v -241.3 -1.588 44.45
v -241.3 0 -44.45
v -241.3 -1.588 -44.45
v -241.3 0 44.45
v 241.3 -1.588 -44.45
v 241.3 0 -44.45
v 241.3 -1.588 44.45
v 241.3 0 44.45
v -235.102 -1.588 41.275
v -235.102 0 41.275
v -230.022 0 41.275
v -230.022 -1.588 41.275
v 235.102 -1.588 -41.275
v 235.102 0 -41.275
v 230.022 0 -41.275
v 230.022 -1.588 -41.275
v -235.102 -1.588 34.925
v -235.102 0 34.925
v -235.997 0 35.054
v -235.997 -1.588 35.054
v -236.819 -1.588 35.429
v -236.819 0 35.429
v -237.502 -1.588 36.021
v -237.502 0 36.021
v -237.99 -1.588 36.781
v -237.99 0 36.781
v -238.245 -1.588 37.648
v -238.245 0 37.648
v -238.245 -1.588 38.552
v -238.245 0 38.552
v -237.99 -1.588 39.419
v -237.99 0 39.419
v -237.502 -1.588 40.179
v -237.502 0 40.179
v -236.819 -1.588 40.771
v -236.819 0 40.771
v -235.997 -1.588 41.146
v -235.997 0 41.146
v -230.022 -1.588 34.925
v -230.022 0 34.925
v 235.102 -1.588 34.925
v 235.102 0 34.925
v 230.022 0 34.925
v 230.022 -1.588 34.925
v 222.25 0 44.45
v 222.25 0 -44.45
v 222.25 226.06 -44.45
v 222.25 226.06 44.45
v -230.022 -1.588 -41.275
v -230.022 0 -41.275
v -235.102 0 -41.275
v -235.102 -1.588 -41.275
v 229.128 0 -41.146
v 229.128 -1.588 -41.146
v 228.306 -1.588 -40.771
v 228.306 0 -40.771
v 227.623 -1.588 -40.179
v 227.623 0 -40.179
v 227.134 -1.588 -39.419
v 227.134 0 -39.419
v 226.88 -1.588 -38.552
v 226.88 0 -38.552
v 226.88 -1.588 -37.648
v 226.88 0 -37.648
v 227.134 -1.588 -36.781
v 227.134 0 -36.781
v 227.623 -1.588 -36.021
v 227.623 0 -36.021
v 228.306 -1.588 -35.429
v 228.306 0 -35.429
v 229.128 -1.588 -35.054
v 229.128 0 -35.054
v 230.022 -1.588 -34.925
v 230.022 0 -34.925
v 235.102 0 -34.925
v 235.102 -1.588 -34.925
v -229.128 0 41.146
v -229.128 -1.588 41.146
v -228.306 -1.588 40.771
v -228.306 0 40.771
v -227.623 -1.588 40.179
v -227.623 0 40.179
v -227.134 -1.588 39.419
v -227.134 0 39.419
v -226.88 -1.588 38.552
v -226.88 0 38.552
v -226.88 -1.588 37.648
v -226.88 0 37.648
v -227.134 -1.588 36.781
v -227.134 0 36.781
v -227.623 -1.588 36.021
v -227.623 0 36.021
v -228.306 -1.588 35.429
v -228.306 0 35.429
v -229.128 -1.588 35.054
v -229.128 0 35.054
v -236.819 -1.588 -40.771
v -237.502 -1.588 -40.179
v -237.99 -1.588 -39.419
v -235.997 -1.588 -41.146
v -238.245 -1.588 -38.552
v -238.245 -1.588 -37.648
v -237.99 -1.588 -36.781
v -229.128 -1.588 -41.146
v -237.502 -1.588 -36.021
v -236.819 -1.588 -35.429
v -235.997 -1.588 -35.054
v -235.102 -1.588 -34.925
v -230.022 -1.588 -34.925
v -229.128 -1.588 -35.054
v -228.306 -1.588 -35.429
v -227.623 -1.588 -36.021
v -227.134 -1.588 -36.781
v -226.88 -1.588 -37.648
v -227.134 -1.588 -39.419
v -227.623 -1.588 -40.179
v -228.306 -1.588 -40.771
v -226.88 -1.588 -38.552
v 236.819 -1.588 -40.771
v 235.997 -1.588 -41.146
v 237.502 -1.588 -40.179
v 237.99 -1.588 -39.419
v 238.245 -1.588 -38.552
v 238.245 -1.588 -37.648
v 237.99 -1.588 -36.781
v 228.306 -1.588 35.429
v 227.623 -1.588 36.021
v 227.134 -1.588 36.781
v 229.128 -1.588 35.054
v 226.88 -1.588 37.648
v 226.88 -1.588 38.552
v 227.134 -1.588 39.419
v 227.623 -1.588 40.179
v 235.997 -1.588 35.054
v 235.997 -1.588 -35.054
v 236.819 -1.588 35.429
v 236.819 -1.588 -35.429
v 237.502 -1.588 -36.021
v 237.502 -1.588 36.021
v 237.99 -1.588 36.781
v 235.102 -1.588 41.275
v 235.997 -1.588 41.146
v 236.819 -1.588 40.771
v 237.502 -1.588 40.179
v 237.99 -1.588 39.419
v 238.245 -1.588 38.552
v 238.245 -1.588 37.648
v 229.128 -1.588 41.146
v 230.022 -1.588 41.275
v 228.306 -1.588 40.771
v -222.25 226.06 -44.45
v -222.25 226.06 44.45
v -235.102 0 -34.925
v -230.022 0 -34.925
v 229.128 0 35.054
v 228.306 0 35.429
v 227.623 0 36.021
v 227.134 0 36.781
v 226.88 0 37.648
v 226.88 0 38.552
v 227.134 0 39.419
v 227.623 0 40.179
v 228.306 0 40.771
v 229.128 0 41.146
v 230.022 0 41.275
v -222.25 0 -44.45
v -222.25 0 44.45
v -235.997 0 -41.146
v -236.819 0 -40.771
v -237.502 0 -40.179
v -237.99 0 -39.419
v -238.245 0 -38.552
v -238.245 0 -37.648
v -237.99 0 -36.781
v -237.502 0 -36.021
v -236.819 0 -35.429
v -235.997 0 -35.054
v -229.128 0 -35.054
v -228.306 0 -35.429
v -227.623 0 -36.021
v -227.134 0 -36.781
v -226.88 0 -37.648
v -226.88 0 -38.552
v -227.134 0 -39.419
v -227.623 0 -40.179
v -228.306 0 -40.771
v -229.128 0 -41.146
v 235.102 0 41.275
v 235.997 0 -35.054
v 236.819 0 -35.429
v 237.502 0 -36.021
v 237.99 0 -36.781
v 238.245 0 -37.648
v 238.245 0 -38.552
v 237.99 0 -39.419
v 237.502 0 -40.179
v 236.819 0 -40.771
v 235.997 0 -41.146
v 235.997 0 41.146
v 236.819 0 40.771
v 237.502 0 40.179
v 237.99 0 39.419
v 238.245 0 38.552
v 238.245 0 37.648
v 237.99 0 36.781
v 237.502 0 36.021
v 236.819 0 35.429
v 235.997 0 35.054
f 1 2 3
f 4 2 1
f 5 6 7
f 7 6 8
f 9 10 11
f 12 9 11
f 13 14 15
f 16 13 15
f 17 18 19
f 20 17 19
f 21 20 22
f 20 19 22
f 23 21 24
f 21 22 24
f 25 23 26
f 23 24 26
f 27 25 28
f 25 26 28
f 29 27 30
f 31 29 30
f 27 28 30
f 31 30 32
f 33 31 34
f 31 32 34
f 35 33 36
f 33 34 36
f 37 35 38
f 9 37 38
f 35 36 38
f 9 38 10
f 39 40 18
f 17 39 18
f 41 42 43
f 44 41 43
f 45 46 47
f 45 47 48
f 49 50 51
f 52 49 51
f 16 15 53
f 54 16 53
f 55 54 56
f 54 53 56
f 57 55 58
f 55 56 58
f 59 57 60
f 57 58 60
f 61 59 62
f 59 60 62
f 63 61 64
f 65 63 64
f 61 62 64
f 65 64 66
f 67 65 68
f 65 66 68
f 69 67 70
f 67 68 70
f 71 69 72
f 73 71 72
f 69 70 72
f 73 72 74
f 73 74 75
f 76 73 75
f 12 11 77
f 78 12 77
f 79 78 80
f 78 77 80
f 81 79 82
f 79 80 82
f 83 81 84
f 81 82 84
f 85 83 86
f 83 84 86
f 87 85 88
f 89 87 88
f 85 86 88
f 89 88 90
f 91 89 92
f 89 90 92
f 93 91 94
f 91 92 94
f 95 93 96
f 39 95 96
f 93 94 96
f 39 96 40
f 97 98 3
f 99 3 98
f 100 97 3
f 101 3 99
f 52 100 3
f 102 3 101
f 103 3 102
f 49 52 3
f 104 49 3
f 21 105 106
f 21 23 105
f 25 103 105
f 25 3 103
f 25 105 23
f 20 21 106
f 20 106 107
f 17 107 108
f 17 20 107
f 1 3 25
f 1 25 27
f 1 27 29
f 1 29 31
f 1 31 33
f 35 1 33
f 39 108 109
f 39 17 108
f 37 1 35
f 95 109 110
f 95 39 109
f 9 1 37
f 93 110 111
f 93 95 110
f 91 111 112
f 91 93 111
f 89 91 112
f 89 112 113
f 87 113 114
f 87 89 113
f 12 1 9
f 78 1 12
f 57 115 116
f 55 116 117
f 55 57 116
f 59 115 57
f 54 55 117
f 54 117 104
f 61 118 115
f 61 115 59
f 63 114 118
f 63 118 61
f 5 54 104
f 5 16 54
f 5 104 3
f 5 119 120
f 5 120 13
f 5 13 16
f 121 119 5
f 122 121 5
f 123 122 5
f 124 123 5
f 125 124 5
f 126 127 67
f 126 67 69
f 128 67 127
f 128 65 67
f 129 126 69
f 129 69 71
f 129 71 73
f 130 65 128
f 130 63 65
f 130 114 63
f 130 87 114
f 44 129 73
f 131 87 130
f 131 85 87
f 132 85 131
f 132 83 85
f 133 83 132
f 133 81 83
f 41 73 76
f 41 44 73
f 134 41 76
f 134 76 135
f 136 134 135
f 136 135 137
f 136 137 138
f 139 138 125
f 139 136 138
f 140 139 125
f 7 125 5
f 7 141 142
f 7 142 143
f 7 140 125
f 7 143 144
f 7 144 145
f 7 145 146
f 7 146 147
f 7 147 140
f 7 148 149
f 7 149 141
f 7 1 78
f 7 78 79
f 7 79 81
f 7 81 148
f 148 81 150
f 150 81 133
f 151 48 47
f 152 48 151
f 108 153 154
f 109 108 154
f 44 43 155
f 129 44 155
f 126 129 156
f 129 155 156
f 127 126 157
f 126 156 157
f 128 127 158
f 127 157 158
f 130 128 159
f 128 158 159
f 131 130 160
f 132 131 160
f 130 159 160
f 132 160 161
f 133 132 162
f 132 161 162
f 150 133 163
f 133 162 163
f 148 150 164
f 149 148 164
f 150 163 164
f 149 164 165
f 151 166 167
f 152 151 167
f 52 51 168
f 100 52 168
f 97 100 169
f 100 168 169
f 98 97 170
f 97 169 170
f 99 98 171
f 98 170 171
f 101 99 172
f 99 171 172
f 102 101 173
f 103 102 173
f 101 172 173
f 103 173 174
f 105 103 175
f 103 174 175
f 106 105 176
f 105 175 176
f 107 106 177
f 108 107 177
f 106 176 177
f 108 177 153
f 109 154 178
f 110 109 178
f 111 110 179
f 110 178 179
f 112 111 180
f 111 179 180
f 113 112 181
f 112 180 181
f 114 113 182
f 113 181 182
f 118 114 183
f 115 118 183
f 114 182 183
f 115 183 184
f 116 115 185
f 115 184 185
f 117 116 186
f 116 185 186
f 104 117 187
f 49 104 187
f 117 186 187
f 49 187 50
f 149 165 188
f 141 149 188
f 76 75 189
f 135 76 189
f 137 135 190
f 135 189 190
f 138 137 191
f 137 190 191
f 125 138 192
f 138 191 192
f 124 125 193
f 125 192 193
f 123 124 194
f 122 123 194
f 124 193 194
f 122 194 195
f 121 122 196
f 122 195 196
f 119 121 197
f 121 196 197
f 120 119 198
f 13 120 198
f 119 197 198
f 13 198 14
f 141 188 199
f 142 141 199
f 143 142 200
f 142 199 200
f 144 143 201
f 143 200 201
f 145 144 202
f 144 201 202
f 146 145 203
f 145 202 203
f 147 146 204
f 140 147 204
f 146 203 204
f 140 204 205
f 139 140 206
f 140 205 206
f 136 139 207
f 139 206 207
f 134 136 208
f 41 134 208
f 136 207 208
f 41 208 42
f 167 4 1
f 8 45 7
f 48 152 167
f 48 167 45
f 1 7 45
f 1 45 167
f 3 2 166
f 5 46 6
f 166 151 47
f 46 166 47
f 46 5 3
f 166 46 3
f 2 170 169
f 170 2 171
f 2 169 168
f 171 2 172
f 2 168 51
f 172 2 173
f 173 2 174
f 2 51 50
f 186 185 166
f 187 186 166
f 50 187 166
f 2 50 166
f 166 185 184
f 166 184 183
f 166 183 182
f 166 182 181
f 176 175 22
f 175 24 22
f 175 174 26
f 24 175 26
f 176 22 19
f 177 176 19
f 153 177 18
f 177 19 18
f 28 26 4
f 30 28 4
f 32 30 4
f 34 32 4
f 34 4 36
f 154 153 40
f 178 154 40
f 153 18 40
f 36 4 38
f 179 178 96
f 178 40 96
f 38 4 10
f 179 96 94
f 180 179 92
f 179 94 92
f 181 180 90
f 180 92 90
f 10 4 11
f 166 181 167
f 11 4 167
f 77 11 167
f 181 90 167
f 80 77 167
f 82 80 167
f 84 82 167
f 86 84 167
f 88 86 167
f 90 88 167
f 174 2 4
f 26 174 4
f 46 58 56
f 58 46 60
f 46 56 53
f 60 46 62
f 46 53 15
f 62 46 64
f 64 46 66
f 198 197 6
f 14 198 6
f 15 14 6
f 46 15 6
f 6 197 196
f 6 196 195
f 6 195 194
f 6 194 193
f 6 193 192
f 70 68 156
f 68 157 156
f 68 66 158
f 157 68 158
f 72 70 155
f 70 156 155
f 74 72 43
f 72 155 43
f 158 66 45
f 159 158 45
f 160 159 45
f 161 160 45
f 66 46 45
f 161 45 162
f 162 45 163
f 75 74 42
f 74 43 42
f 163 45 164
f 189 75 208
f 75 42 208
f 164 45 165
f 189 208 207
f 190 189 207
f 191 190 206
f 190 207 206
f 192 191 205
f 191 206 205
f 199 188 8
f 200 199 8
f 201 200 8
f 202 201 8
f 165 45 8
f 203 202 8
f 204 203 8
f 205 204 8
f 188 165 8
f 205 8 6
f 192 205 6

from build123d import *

# Parameters (mm, degrees)
F1_W     = 482.6
F1_H     = 88.9
F2_DEPTH = 1.5875
F3_W     = 444.5
F3_H     = 88.9
F4_DEPTH = 226.06


# Not quite as in the source:
# - a variable given as a bare number and used for a length is read in inches; the dataset says mm whatever the document's units were


with BuildPart() as f2:
    # F1 (on Front) → F2 (new body)
    with BuildSketch(Plane.XZ):
        Rectangle(F1_W, F1_H)
        with BuildLine():
            Line((-235.1024, -34.925), (-230.0224, -34.925))
            ThreePointArc((-230.0224, -34.925), (-226.8474, -38.1), (-230.0224, -41.275))
            Line((-230.0224, -41.275), (-235.1024, -41.275))
            ThreePointArc((-235.1024, -41.275), (-238.2774, -38.1), (-235.1024, -34.925))
        make_face(mode=Mode.SUBTRACT)
        with BuildLine():
            Line((230.0224, -34.925), (235.1024, -34.925))
            ThreePointArc((235.1024, -34.925), (238.2774, -38.1), (235.1024, -41.275))
            Line((235.1024, -41.275), (230.0224, -41.275))
            ThreePointArc((230.0224, -41.275), (226.8474, -38.1), (230.0224, -34.925))
        make_face(mode=Mode.SUBTRACT)
        with BuildLine():
            ThreePointArc((-235.1024, 34.925), (-238.2774, 38.1), (-235.1024, 41.275))
            Line((-235.1024, 41.275), (-230.0224, 41.275))
            ThreePointArc((-230.0224, 41.275), (-226.8474, 38.1), (-230.0224, 34.925))
            Line((-230.0224, 34.925), (-235.1024, 34.925))
        make_face(mode=Mode.SUBTRACT)
        with BuildLine():
            Line((235.1024, 34.925), (230.0224, 34.925))
            ThreePointArc((230.0224, 34.925), (226.8474, 38.1), (230.0224, 41.275))
            Line((230.0224, 41.275), (235.1024, 41.275))
            ThreePointArc((235.1024, 41.275), (238.2774, 38.1), (235.1024, 34.925))
        make_face(mode=Mode.SUBTRACT)
    extrude(amount=F2_DEPTH)

    # F3 (on face) → F4 (join)
    with BuildSketch(Plane(origin=(0, 0, 0), x_dir=(-1, 0, 0), z_dir=(0, 1, 0))):
        Rectangle(F3_W, F3_H)
    extrude(amount=F4_DEPTH)


solid = f2.part
